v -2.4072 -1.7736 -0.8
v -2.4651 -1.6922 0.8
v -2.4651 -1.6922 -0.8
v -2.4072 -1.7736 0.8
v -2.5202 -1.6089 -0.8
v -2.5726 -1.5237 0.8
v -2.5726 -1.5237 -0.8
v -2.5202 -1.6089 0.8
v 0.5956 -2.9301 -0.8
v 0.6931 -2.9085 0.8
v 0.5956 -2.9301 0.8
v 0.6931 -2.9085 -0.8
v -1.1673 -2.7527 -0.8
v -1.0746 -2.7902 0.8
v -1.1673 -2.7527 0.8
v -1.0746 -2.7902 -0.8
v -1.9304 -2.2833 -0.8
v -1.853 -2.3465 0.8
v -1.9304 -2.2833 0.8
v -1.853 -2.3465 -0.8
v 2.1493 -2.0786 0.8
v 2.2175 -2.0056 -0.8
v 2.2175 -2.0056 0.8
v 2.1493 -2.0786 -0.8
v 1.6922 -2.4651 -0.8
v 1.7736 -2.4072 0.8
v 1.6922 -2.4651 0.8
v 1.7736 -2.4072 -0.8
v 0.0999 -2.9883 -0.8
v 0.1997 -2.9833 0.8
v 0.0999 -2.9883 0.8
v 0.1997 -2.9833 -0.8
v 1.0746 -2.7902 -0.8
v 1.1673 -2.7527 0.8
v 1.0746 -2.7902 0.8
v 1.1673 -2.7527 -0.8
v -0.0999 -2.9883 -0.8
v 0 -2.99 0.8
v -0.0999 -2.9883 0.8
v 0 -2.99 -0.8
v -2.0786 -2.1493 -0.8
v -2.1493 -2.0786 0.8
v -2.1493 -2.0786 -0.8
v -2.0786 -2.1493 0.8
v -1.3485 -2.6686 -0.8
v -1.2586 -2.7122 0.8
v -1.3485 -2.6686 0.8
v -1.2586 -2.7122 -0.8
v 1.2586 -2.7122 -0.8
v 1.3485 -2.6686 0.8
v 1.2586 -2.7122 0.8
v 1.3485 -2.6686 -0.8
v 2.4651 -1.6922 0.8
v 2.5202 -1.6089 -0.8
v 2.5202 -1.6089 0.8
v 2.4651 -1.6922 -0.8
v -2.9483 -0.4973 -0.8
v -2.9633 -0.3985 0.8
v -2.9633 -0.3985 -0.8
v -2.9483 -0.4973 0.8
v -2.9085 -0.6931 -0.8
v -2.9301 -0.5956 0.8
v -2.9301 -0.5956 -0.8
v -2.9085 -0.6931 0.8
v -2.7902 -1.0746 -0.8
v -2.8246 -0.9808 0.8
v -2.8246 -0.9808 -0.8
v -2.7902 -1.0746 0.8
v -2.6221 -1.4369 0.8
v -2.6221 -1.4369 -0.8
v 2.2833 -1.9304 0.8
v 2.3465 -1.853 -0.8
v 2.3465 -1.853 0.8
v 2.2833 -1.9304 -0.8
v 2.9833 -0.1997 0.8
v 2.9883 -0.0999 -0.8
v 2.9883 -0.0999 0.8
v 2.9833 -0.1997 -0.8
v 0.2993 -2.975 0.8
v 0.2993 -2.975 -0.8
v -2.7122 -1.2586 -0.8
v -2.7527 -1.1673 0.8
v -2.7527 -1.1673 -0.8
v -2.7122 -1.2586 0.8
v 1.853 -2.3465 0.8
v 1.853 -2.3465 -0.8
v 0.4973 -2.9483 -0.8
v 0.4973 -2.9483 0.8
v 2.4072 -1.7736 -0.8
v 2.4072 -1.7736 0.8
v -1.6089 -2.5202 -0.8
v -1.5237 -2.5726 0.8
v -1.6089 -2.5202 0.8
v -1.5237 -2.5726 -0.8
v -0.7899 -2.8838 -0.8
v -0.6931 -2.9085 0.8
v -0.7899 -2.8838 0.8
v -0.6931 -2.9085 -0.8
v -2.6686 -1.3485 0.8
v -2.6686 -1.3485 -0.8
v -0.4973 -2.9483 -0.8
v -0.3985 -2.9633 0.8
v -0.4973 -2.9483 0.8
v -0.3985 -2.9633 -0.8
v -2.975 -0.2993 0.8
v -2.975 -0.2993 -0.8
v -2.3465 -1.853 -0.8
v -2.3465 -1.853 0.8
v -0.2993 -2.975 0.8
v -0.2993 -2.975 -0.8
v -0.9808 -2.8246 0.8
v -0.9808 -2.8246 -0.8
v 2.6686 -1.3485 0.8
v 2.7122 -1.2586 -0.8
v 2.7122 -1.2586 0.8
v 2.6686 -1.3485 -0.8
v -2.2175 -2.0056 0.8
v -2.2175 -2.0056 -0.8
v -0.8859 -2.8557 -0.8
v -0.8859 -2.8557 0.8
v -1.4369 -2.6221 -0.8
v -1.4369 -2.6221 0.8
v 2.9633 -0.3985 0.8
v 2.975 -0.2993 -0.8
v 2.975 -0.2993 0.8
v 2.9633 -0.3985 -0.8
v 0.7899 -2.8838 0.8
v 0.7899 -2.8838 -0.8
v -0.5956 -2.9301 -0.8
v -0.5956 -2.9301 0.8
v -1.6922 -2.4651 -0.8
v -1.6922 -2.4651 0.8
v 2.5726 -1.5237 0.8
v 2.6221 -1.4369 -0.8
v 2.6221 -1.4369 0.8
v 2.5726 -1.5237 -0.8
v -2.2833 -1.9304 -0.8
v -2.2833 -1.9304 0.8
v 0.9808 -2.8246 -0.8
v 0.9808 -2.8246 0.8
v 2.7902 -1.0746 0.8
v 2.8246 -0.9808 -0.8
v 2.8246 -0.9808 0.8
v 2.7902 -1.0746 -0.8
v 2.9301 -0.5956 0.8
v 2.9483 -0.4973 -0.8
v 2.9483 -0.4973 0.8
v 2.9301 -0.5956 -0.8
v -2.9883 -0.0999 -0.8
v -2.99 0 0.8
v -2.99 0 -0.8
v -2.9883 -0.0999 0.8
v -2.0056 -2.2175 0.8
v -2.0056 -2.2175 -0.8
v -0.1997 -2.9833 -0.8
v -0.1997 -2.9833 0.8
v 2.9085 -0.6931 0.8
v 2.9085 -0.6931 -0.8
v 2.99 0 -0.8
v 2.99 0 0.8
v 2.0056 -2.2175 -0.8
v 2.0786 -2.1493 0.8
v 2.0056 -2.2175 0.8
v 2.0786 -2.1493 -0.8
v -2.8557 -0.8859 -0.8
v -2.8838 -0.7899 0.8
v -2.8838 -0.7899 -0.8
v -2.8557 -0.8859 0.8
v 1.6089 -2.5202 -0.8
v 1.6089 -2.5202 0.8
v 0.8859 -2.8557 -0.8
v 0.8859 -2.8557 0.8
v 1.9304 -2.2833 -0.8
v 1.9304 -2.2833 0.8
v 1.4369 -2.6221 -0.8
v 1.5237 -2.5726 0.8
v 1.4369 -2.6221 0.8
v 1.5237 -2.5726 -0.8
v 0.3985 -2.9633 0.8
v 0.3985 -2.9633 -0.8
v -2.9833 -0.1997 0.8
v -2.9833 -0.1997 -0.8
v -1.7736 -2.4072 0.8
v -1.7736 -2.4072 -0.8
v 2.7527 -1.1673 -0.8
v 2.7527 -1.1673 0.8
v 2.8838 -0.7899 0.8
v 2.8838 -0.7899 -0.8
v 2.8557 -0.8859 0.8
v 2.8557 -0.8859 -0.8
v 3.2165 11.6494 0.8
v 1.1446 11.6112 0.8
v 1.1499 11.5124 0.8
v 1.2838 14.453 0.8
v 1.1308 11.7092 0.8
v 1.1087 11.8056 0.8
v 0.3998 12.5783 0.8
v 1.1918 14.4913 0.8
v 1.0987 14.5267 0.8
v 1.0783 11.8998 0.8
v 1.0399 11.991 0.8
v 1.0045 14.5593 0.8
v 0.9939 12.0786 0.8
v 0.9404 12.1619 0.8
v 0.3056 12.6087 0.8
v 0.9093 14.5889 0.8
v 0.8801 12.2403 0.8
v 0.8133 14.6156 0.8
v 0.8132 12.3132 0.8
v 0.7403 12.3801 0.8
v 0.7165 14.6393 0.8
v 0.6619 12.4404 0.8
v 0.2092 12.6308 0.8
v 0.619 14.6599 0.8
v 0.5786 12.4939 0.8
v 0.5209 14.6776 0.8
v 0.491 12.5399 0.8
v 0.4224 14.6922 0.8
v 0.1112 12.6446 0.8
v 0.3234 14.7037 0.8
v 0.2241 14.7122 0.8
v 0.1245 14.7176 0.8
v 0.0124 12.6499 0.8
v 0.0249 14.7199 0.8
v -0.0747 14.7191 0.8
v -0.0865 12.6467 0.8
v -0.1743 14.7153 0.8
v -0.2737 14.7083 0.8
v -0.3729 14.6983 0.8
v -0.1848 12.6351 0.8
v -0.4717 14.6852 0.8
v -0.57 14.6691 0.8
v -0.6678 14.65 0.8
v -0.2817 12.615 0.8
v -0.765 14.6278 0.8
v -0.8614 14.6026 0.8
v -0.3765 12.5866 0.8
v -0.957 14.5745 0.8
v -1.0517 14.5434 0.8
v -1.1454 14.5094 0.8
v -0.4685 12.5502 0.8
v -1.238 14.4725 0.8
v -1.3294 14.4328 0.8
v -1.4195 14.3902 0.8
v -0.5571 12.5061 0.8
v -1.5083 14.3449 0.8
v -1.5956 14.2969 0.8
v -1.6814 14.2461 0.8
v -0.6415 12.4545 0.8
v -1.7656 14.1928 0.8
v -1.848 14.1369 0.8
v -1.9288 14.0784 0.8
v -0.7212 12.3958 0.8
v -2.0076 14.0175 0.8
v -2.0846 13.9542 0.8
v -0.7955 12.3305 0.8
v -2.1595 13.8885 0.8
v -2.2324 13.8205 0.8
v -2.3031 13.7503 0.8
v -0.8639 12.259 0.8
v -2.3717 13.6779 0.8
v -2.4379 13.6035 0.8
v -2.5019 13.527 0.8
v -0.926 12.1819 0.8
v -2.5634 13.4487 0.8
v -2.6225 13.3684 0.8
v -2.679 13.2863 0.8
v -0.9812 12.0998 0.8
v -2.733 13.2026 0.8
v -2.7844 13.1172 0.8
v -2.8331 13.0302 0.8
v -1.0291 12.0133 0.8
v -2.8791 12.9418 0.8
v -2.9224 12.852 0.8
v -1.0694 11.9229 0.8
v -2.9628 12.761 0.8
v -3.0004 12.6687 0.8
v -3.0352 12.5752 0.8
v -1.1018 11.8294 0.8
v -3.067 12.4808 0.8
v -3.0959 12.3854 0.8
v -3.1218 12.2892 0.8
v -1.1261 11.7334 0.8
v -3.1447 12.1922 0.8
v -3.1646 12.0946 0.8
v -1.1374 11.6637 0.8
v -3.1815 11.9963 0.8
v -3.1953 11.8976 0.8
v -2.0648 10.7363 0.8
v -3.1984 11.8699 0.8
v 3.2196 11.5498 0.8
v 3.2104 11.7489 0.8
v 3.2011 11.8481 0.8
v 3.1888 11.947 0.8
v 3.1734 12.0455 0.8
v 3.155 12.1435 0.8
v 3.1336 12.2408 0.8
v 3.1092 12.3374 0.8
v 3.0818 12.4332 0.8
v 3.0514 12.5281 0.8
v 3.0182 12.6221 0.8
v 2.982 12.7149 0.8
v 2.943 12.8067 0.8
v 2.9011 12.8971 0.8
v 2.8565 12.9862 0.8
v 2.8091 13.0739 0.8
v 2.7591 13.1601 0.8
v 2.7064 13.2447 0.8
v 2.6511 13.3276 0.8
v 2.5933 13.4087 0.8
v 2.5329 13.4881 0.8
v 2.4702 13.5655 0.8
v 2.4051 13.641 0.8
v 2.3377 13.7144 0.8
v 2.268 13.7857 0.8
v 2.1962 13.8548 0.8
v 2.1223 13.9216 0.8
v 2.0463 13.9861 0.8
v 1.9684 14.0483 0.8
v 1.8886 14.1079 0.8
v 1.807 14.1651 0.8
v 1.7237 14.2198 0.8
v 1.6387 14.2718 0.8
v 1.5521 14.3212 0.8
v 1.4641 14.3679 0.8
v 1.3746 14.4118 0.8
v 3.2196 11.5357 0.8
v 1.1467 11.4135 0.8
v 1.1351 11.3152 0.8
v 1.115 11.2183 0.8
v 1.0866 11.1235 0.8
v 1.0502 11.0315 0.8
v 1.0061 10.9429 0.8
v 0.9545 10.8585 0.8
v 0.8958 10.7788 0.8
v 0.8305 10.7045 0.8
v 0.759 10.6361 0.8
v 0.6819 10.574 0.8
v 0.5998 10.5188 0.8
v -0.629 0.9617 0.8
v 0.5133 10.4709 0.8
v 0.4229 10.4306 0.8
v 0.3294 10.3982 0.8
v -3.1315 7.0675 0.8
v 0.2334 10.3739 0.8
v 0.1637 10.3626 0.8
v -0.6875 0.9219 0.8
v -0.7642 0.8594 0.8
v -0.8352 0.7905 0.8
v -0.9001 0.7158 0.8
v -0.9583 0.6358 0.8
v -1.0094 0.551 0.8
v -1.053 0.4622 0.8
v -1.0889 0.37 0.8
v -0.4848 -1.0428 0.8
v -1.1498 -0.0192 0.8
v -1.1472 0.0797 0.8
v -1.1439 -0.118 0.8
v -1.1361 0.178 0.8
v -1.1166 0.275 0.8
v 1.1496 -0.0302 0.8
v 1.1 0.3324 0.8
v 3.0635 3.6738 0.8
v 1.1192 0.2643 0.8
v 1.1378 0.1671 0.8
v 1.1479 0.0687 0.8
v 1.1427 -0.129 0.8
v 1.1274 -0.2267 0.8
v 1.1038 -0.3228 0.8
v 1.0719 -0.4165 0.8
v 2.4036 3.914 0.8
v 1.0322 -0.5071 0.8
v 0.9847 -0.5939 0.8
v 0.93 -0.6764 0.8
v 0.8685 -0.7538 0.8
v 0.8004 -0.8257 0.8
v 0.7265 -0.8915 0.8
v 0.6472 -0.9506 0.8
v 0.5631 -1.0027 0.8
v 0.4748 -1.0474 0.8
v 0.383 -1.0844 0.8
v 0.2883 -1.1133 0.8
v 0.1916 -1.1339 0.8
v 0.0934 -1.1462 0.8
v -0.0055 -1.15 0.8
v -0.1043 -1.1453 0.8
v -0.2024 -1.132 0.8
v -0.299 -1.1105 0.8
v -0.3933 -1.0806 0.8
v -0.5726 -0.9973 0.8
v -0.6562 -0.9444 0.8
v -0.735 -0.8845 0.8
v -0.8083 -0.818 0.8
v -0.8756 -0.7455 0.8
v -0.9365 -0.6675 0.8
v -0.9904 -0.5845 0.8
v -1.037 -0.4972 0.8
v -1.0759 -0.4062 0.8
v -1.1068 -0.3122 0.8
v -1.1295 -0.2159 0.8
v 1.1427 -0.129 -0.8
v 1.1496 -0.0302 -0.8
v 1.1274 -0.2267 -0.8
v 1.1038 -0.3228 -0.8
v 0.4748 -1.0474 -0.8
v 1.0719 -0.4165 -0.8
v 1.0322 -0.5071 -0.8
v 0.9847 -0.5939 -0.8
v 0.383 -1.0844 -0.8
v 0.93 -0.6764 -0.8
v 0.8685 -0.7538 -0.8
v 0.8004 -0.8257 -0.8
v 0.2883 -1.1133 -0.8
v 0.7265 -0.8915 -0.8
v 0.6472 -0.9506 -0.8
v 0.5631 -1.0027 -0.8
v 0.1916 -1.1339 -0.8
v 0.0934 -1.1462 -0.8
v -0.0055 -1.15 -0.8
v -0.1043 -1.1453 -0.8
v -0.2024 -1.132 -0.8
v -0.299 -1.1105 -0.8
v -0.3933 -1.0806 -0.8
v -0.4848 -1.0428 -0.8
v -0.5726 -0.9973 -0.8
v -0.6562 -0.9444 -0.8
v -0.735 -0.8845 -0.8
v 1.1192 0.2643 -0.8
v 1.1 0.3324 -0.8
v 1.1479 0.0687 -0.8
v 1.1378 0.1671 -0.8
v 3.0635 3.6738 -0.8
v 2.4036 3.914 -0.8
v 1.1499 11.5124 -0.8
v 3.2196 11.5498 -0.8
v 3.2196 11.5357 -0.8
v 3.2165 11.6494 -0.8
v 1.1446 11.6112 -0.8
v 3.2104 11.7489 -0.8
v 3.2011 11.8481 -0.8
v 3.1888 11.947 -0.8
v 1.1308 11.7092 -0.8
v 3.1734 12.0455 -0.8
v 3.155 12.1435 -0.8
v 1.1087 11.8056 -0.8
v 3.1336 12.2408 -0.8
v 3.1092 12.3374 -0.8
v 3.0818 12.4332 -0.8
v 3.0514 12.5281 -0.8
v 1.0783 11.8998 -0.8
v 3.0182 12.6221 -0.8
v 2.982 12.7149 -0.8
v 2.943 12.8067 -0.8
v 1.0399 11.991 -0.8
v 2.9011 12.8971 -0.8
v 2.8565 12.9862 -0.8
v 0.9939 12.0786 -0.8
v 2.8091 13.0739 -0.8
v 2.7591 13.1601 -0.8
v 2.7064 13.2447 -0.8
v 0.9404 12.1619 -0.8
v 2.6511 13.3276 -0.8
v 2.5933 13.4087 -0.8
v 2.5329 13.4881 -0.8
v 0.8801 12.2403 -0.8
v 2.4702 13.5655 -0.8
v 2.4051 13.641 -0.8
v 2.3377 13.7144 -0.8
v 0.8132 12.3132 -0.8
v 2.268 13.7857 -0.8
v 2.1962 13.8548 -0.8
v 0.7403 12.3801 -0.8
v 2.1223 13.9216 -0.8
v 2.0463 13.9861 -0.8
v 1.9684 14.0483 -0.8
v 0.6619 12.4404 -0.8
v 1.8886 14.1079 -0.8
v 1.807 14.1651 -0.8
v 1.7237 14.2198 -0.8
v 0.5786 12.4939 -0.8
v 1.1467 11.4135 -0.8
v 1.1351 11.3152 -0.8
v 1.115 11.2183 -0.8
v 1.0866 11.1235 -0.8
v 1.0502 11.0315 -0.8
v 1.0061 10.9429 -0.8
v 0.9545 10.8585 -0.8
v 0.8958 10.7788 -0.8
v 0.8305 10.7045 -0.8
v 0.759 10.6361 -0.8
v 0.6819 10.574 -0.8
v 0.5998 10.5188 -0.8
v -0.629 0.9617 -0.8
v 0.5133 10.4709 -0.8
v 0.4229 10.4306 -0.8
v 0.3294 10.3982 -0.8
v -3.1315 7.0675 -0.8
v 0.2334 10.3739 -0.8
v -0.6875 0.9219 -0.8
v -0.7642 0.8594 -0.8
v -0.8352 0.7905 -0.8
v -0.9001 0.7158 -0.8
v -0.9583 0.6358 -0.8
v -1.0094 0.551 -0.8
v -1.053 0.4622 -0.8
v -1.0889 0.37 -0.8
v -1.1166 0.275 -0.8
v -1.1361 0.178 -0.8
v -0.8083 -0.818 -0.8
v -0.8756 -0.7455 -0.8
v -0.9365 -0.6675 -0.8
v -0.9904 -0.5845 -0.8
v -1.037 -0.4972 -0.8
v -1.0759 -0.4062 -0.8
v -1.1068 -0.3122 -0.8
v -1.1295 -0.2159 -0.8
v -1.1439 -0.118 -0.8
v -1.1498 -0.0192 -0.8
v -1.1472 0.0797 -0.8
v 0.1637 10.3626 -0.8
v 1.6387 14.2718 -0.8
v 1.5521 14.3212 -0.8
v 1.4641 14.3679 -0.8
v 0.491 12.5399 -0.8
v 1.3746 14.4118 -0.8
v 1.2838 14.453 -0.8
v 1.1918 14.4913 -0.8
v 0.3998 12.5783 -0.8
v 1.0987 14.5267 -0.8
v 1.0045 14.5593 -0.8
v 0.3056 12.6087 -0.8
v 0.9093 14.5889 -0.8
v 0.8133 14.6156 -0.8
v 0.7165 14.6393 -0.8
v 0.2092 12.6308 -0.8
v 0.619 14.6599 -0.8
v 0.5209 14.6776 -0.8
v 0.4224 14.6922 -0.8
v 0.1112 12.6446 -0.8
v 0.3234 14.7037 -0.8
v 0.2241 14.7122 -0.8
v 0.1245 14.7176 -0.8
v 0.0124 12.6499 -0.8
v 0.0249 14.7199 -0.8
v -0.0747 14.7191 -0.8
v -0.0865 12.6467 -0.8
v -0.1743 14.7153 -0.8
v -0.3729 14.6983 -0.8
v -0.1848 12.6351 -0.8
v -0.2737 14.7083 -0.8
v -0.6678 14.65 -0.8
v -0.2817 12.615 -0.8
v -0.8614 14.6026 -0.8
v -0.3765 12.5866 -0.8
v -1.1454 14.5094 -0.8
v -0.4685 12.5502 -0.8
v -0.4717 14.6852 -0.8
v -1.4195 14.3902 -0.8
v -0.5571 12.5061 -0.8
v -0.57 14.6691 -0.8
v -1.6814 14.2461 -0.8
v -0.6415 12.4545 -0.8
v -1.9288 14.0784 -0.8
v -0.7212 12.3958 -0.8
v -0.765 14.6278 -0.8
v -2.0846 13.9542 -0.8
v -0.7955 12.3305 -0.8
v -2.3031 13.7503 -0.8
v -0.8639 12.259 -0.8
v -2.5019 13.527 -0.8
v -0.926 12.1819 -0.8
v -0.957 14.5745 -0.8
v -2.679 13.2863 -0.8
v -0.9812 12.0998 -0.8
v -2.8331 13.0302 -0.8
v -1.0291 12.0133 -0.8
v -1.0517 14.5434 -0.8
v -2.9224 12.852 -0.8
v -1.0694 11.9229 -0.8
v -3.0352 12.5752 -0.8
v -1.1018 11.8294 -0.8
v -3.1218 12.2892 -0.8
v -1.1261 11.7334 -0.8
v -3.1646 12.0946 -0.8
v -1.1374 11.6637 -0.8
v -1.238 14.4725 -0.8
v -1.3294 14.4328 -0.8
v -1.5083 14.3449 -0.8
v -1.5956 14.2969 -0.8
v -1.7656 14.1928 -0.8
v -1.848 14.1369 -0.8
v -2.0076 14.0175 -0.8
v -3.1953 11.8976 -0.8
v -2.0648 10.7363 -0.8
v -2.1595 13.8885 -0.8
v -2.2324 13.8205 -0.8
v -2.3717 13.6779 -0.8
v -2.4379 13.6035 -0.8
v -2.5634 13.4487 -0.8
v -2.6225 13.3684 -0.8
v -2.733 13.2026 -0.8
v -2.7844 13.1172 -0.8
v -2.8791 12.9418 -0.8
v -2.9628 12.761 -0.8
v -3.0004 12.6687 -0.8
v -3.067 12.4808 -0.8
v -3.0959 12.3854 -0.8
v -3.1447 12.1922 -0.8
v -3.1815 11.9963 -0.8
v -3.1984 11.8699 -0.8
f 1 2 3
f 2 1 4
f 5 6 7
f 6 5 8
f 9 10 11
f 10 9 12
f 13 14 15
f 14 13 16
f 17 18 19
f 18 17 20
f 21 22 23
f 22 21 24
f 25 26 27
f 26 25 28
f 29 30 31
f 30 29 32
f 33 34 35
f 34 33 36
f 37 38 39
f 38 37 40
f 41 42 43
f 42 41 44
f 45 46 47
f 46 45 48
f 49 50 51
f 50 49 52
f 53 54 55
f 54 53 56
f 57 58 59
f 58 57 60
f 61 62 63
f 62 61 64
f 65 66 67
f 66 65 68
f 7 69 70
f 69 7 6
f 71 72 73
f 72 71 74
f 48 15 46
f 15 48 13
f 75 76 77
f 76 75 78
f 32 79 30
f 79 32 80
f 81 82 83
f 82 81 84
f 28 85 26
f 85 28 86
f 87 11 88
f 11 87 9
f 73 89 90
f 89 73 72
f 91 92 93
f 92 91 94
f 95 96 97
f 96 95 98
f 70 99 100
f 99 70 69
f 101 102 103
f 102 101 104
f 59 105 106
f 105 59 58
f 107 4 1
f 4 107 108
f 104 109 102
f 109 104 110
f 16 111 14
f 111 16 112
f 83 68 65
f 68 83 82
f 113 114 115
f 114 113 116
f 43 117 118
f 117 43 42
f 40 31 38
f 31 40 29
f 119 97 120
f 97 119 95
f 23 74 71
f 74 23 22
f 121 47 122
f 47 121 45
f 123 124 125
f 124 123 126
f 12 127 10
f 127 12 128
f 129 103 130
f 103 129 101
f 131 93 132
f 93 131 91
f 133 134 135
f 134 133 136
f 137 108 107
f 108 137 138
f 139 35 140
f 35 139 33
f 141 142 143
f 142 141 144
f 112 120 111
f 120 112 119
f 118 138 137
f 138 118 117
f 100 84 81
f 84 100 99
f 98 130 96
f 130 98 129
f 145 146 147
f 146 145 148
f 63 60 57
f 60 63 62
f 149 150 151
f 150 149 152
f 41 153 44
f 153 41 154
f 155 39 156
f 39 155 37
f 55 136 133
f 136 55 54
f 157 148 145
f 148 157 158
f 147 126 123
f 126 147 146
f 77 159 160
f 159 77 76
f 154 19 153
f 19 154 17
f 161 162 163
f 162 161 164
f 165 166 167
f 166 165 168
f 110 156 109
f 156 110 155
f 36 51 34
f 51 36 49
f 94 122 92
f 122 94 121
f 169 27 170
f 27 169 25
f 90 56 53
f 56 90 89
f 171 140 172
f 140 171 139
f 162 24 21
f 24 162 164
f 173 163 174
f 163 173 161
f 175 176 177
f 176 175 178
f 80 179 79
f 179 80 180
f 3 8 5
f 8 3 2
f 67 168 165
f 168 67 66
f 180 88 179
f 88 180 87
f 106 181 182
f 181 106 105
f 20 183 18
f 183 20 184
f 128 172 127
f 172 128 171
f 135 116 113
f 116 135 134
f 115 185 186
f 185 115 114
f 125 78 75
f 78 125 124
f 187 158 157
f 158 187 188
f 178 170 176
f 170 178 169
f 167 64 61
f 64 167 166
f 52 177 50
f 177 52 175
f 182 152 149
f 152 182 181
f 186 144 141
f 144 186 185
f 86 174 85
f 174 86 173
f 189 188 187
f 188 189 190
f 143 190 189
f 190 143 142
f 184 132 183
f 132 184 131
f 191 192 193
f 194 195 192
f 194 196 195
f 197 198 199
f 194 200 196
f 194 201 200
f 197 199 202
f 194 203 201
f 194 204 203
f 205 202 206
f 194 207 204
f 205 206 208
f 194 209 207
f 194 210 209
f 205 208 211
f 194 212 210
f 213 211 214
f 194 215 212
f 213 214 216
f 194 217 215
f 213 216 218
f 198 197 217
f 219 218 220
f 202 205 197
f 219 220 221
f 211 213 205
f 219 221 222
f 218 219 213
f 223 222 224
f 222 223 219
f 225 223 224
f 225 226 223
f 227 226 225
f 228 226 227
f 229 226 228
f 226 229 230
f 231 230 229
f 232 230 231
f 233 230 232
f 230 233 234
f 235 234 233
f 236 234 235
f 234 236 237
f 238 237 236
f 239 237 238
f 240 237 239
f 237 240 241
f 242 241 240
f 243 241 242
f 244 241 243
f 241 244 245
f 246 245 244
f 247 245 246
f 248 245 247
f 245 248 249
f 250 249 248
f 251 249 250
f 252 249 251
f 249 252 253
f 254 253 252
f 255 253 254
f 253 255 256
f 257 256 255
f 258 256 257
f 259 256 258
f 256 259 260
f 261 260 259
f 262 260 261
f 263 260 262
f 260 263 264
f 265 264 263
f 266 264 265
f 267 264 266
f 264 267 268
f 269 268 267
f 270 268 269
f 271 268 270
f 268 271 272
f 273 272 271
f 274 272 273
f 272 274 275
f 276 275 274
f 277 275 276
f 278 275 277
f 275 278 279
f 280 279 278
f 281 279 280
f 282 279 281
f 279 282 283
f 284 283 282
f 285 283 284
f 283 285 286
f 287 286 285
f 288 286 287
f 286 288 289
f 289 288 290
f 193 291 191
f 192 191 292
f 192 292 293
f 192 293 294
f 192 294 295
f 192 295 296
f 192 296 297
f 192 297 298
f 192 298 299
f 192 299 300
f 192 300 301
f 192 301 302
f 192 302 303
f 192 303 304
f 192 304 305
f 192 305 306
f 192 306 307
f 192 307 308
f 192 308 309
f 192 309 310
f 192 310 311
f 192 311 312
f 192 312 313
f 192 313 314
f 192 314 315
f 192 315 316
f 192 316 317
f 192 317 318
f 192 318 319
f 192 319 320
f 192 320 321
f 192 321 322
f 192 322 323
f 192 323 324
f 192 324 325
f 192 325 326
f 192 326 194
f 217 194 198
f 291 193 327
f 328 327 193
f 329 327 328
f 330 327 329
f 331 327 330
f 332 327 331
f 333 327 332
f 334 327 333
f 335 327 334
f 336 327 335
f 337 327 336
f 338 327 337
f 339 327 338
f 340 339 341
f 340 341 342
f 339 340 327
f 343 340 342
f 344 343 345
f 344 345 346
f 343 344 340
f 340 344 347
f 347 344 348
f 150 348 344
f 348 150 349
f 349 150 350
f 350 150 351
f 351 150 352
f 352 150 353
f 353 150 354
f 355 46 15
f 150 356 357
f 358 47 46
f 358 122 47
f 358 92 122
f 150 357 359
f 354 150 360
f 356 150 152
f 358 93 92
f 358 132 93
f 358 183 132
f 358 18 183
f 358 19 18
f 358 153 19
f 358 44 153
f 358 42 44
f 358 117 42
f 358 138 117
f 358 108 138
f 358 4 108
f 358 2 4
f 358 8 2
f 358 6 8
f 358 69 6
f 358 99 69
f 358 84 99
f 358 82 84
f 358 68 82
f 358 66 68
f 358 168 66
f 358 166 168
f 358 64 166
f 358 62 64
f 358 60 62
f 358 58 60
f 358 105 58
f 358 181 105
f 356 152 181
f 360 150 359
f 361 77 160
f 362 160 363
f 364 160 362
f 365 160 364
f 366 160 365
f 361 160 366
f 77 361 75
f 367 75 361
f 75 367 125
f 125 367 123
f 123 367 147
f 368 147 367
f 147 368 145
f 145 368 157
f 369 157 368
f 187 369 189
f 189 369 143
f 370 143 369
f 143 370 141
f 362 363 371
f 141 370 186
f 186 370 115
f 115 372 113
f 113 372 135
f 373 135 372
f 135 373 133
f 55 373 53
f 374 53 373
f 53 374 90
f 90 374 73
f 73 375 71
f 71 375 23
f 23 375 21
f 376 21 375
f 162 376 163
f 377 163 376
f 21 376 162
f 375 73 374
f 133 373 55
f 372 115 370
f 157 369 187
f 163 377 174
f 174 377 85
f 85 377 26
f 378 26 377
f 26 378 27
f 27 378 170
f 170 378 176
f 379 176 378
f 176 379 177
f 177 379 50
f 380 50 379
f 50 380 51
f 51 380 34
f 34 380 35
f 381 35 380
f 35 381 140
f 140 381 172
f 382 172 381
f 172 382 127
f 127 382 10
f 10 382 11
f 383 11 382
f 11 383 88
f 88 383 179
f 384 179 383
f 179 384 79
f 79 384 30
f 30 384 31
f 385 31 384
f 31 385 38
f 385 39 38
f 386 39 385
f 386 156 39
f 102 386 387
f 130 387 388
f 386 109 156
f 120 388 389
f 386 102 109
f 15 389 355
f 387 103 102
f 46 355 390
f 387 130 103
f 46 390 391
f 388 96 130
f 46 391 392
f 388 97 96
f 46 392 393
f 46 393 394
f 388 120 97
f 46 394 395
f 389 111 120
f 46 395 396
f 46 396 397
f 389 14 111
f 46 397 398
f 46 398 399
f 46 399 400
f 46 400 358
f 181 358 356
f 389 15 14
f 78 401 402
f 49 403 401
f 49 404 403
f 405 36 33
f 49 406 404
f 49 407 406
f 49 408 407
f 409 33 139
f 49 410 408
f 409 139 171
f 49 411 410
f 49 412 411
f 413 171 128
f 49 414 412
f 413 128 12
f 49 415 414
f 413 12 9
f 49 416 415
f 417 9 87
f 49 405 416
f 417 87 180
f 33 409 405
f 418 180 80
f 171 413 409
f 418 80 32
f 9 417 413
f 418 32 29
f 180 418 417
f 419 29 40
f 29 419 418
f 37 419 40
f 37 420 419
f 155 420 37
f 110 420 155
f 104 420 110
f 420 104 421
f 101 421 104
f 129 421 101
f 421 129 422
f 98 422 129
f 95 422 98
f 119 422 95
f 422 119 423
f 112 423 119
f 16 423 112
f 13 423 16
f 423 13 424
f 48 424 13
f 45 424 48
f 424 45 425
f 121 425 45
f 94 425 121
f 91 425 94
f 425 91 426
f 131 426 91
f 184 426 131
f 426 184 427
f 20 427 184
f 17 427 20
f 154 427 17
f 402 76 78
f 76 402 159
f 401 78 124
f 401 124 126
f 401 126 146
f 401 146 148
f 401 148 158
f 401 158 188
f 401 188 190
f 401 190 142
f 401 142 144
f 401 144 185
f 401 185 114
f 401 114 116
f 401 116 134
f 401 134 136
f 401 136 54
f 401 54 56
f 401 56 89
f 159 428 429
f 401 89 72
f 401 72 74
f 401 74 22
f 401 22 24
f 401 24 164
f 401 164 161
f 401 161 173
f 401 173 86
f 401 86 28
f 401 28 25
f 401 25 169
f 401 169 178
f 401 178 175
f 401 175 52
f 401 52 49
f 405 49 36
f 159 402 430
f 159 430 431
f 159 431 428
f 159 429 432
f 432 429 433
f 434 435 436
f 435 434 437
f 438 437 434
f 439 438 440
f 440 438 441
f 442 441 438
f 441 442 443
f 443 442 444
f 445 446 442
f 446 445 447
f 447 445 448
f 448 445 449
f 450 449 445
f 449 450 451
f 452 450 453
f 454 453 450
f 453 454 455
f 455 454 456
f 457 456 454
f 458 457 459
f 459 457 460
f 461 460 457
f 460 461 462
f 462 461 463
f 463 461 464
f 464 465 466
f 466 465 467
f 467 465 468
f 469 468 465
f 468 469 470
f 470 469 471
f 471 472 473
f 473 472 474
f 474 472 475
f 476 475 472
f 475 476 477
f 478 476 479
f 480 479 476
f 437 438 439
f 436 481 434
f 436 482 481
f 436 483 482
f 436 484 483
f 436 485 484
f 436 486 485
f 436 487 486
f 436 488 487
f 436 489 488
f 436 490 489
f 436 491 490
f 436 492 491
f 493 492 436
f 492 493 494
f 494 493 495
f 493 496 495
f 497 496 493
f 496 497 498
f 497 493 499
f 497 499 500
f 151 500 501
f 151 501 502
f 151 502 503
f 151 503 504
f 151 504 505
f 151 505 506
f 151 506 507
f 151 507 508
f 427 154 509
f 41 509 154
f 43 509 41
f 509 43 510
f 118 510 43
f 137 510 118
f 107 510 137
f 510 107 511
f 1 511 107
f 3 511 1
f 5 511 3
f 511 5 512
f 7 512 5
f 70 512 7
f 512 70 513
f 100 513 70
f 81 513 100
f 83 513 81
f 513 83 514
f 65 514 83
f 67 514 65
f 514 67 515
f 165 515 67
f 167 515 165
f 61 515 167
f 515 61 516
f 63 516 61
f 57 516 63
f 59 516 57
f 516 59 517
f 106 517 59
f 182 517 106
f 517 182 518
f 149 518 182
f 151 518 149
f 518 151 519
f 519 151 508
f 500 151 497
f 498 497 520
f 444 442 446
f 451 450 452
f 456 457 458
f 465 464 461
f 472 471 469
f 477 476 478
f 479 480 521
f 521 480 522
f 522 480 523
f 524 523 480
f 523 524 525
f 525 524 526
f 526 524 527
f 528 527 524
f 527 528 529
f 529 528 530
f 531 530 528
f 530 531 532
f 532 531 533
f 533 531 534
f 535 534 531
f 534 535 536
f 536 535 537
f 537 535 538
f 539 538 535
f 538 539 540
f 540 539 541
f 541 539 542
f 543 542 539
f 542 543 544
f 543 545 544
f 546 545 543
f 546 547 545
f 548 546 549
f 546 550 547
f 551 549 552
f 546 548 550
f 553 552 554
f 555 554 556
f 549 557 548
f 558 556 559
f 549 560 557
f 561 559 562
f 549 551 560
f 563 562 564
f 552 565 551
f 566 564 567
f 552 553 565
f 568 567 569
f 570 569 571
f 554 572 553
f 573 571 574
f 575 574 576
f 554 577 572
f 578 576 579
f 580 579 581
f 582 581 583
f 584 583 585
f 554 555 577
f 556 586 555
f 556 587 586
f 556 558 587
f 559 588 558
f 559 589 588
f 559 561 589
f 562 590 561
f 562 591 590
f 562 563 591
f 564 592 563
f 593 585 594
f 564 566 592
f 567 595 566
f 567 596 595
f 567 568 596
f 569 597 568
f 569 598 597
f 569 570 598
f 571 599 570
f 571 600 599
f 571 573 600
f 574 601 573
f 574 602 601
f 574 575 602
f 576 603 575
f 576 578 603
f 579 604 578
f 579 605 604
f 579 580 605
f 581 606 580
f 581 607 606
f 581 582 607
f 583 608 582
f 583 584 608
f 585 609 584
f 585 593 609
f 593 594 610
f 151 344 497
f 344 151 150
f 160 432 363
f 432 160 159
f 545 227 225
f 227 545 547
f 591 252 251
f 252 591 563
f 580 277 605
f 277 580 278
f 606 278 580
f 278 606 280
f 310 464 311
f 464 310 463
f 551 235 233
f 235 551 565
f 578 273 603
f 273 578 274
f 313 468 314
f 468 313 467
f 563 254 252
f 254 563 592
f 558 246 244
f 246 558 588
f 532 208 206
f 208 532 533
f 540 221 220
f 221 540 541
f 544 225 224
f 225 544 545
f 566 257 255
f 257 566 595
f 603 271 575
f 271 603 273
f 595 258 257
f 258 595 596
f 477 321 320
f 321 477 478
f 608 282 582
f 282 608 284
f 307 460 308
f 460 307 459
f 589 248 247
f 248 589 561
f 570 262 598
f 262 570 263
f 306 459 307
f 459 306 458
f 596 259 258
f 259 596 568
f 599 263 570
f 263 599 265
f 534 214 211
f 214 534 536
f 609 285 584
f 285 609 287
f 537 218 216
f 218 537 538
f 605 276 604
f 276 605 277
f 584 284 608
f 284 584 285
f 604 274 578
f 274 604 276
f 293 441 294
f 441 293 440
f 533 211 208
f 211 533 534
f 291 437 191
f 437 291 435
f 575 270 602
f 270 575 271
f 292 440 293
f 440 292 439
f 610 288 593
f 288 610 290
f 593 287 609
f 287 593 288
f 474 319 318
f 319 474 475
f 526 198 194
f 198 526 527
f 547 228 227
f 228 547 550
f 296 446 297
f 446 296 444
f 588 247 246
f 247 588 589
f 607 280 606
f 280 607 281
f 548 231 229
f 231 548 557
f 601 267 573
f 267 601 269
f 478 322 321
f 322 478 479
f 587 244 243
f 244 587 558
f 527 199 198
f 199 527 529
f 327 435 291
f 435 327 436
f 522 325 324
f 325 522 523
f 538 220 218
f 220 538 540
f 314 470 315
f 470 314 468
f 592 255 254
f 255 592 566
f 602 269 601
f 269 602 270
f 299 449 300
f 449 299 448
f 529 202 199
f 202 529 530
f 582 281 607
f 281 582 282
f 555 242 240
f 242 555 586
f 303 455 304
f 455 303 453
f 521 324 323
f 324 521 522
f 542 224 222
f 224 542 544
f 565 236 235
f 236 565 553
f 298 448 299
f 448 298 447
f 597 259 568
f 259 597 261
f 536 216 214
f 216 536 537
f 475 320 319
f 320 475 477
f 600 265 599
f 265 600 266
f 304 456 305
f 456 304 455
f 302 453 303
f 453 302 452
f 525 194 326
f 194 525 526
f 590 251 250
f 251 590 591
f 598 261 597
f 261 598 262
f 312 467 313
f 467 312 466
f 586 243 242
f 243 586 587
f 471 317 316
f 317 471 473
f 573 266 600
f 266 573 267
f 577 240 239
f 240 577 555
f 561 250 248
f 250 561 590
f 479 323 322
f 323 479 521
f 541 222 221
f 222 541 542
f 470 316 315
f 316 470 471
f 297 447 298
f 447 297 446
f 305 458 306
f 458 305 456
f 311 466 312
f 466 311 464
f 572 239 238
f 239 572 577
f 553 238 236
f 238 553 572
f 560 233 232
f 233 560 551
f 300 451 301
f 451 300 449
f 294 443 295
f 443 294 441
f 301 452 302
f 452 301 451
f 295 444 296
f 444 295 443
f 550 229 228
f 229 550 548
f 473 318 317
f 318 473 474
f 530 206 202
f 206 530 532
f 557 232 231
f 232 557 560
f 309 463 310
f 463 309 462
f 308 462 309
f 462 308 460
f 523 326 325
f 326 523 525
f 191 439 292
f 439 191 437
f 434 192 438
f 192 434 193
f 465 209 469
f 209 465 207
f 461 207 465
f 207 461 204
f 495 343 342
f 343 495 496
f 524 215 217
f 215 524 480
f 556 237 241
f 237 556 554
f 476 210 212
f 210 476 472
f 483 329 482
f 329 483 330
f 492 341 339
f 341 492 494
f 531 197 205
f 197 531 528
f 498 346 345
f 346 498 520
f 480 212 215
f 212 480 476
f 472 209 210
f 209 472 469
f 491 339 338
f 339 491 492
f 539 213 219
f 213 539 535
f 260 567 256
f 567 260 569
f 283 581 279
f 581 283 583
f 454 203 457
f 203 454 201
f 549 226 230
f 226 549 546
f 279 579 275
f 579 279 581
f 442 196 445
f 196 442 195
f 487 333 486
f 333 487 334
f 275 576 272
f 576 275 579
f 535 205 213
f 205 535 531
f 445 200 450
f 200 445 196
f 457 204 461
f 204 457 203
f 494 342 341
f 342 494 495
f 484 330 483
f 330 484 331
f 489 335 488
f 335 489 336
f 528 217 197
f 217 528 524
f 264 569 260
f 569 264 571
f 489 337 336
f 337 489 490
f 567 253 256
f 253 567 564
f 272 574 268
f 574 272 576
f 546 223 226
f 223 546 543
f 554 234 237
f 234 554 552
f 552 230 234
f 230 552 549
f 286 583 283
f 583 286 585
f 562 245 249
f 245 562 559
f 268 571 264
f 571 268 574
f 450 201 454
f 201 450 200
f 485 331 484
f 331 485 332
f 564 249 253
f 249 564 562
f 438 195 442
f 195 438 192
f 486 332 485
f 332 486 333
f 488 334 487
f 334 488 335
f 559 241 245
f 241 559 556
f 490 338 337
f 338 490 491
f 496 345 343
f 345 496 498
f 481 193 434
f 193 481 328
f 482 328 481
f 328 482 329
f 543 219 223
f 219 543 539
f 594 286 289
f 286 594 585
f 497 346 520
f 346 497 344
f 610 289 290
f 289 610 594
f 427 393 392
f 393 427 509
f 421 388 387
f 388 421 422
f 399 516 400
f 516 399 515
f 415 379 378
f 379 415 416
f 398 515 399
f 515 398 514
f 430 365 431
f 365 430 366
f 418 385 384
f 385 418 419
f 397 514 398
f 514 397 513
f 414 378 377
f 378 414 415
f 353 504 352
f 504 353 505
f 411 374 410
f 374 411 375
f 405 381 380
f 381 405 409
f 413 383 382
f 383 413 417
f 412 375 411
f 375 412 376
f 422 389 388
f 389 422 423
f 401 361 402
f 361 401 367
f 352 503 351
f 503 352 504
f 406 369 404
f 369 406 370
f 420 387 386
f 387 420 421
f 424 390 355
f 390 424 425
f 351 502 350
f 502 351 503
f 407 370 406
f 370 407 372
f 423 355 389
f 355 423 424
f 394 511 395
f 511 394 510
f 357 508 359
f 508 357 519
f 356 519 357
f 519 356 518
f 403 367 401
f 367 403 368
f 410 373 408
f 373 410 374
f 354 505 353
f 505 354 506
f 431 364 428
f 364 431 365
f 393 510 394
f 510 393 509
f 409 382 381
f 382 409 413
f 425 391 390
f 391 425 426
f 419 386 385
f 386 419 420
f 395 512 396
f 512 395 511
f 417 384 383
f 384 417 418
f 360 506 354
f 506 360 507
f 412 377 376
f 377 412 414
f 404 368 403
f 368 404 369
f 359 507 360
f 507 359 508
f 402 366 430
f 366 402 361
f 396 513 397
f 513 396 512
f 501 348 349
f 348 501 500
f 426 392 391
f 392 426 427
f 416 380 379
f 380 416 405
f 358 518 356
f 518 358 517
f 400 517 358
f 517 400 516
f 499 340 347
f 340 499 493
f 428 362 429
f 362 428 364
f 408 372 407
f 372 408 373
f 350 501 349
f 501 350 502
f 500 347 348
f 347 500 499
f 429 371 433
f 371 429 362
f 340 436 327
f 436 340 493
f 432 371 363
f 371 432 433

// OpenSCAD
include <../lib/inc.scad>

module assembly(th=th,w1=8,w2=8,holes){
   h=holes[0][1]+0;


  difference(){
    rotate([-90,0,0])
    body(th,w1,w2,h);
  
    for(i = holes){
       translate([0,i[1],0])
       rotate([0,0,i[2]])
       union(){
            cyl(r=i[0]/2,h=th+e);
       
            translate([-10,0,0])
            cube([20,i[0]*.8,th+e],center=true);
            if(i[3]){
                translate([-i[3],i[0],0])
                rotate([0,0,0])
                cube([5,i[0]*2,th+e],center=true);
            }
           
        }
    }
  }
}
d=2.3;
th=5*.32;

assembly(w1=d*2.6,w2=d*2.8,holes=[
  //[d, d*9, 45, 4.5],
  //[d, d*7, 45, 4.5],
  [d, d*5, 45, 4.5],
  [d, 0, 180+70, 7],
]);
